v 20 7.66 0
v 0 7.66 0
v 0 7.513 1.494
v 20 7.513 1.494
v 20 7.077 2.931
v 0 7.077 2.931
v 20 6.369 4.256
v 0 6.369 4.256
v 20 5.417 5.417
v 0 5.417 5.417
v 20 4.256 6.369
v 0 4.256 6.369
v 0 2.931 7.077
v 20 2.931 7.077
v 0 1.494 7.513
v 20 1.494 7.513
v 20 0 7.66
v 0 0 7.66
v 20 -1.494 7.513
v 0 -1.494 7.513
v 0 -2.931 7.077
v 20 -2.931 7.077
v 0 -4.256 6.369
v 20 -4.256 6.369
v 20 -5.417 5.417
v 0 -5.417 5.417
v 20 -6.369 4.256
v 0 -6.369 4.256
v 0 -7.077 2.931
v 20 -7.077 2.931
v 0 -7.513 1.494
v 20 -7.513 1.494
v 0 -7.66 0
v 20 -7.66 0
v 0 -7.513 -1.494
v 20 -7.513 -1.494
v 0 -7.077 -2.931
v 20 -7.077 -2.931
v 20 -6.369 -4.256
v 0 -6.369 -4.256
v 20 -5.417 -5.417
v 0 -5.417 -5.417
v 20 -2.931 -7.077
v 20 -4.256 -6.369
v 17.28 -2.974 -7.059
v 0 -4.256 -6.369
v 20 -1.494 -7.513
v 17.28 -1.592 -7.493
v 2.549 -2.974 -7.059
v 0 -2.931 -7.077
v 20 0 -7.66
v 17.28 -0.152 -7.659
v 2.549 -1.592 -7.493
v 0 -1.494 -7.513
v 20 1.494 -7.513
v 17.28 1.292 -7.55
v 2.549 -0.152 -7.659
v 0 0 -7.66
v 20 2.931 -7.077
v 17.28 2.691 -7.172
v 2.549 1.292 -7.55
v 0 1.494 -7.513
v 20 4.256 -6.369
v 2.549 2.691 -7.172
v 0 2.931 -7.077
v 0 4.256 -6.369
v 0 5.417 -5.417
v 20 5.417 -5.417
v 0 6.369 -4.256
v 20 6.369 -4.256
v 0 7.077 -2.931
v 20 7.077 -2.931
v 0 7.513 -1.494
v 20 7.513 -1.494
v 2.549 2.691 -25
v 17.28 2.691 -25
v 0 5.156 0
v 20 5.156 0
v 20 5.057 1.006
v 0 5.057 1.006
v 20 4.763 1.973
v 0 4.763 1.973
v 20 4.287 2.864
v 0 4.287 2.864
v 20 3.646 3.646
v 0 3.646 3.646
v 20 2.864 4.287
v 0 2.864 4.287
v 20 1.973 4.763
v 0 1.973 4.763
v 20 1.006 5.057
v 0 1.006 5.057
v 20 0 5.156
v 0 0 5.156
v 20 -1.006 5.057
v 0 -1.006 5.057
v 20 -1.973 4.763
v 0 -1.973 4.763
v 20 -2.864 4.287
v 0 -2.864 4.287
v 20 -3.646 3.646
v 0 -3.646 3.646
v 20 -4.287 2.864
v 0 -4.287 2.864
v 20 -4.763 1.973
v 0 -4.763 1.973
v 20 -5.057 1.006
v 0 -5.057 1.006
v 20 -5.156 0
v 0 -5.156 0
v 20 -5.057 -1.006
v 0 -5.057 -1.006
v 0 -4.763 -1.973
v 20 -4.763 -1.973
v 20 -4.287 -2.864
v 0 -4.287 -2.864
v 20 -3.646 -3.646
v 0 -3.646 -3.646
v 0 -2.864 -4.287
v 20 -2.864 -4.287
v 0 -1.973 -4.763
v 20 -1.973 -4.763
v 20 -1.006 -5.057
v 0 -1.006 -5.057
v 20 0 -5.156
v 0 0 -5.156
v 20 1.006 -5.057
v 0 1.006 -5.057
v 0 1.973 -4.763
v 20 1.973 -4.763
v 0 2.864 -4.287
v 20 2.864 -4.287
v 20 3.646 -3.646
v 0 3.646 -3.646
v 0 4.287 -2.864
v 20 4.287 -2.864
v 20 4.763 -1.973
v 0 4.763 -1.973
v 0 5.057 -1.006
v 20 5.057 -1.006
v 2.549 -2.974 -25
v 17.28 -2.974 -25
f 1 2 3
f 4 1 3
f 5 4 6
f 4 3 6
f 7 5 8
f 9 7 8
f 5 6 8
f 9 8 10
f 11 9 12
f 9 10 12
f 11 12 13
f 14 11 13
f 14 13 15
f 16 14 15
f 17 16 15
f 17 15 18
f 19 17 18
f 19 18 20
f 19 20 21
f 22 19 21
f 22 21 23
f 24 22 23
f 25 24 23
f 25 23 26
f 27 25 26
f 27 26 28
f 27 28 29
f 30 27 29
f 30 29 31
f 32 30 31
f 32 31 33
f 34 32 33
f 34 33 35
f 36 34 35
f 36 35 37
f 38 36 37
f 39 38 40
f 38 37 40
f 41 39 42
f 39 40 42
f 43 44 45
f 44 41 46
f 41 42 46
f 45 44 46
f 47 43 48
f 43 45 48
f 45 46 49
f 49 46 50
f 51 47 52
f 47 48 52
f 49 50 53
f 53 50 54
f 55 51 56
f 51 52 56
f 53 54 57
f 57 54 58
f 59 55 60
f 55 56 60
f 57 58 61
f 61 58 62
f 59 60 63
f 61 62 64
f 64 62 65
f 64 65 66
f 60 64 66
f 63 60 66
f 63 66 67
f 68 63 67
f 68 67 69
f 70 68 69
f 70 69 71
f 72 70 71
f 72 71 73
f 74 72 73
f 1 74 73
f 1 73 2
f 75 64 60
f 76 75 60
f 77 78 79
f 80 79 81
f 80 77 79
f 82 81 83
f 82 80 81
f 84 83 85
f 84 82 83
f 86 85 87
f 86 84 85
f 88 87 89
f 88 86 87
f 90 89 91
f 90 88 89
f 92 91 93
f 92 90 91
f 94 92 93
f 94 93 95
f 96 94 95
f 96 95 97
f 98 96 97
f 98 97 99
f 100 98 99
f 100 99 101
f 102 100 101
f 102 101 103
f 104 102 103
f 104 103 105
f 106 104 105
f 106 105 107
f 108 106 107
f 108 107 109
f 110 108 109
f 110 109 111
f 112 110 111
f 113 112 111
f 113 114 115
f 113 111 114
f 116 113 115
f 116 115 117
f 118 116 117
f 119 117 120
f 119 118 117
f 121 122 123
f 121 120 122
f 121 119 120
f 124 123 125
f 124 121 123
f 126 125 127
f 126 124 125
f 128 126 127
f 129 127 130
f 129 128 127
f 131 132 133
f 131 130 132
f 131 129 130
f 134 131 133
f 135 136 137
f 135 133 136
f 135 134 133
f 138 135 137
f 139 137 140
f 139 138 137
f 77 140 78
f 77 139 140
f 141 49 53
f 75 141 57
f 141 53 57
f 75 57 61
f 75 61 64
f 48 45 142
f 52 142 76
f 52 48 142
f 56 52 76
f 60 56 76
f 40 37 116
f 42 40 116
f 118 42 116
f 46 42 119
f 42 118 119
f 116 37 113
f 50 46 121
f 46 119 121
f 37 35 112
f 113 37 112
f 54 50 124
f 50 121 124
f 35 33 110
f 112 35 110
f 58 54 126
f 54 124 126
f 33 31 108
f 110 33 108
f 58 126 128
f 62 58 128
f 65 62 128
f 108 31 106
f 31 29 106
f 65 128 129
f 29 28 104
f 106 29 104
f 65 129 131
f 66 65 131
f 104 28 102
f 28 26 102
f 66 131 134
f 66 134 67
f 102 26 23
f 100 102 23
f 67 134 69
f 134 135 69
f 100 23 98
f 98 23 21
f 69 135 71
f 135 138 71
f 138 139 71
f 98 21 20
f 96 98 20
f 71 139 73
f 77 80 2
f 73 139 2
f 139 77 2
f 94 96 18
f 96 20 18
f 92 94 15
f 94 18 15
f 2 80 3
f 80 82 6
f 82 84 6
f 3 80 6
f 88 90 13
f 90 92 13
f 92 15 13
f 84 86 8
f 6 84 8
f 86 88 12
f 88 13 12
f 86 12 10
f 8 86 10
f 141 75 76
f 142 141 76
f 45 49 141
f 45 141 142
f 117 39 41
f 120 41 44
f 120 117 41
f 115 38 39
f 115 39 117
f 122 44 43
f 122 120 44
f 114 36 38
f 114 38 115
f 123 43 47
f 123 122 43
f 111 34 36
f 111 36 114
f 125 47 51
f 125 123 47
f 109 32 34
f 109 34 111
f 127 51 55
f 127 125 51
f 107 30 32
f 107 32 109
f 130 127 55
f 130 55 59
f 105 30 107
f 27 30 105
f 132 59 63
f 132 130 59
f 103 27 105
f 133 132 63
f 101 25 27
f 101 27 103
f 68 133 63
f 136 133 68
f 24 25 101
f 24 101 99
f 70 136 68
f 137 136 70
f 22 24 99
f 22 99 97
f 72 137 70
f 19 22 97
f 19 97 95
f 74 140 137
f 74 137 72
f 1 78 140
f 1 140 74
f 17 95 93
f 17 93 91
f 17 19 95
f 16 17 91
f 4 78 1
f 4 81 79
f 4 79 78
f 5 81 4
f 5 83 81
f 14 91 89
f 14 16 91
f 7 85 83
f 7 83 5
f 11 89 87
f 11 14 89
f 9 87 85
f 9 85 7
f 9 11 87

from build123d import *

# Parameters (mm, degrees)
F0_R     = 7.6601757708
F1_DEPTH = 20
F2_W     = 14.7302162368
F2_H     = 5.6654675864
F3_DEPTH = 25
F4_R     = 5.1556537043
F5_DEPTH = 38.2


# Not quite as in the source:
# - a feature of the source that left no trace in its solid (it failed there, or was rolled back) is left out


with BuildPart() as f1:
    # F0 (on Right) → F1 (new body)
    with BuildSketch(Plane.YZ):
        Circle(F0_R)
    extrude(amount=F1_DEPTH)

    # F2 (on Top) → F3 (join)
    with BuildSketch(Plane.XY):
        with Locations((9.9145689746, -0.1416367013)):
            Rectangle(F2_W, F2_H)
    extrude(amount=-F3_DEPTH)

    # F4 (on Right) → F5 (cut)
    with BuildSketch(Plane.YZ):
        Circle(F4_R)
    extrude(amount=F5_DEPTH, mode=Mode.SUBTRACT)


solid = f1.part
